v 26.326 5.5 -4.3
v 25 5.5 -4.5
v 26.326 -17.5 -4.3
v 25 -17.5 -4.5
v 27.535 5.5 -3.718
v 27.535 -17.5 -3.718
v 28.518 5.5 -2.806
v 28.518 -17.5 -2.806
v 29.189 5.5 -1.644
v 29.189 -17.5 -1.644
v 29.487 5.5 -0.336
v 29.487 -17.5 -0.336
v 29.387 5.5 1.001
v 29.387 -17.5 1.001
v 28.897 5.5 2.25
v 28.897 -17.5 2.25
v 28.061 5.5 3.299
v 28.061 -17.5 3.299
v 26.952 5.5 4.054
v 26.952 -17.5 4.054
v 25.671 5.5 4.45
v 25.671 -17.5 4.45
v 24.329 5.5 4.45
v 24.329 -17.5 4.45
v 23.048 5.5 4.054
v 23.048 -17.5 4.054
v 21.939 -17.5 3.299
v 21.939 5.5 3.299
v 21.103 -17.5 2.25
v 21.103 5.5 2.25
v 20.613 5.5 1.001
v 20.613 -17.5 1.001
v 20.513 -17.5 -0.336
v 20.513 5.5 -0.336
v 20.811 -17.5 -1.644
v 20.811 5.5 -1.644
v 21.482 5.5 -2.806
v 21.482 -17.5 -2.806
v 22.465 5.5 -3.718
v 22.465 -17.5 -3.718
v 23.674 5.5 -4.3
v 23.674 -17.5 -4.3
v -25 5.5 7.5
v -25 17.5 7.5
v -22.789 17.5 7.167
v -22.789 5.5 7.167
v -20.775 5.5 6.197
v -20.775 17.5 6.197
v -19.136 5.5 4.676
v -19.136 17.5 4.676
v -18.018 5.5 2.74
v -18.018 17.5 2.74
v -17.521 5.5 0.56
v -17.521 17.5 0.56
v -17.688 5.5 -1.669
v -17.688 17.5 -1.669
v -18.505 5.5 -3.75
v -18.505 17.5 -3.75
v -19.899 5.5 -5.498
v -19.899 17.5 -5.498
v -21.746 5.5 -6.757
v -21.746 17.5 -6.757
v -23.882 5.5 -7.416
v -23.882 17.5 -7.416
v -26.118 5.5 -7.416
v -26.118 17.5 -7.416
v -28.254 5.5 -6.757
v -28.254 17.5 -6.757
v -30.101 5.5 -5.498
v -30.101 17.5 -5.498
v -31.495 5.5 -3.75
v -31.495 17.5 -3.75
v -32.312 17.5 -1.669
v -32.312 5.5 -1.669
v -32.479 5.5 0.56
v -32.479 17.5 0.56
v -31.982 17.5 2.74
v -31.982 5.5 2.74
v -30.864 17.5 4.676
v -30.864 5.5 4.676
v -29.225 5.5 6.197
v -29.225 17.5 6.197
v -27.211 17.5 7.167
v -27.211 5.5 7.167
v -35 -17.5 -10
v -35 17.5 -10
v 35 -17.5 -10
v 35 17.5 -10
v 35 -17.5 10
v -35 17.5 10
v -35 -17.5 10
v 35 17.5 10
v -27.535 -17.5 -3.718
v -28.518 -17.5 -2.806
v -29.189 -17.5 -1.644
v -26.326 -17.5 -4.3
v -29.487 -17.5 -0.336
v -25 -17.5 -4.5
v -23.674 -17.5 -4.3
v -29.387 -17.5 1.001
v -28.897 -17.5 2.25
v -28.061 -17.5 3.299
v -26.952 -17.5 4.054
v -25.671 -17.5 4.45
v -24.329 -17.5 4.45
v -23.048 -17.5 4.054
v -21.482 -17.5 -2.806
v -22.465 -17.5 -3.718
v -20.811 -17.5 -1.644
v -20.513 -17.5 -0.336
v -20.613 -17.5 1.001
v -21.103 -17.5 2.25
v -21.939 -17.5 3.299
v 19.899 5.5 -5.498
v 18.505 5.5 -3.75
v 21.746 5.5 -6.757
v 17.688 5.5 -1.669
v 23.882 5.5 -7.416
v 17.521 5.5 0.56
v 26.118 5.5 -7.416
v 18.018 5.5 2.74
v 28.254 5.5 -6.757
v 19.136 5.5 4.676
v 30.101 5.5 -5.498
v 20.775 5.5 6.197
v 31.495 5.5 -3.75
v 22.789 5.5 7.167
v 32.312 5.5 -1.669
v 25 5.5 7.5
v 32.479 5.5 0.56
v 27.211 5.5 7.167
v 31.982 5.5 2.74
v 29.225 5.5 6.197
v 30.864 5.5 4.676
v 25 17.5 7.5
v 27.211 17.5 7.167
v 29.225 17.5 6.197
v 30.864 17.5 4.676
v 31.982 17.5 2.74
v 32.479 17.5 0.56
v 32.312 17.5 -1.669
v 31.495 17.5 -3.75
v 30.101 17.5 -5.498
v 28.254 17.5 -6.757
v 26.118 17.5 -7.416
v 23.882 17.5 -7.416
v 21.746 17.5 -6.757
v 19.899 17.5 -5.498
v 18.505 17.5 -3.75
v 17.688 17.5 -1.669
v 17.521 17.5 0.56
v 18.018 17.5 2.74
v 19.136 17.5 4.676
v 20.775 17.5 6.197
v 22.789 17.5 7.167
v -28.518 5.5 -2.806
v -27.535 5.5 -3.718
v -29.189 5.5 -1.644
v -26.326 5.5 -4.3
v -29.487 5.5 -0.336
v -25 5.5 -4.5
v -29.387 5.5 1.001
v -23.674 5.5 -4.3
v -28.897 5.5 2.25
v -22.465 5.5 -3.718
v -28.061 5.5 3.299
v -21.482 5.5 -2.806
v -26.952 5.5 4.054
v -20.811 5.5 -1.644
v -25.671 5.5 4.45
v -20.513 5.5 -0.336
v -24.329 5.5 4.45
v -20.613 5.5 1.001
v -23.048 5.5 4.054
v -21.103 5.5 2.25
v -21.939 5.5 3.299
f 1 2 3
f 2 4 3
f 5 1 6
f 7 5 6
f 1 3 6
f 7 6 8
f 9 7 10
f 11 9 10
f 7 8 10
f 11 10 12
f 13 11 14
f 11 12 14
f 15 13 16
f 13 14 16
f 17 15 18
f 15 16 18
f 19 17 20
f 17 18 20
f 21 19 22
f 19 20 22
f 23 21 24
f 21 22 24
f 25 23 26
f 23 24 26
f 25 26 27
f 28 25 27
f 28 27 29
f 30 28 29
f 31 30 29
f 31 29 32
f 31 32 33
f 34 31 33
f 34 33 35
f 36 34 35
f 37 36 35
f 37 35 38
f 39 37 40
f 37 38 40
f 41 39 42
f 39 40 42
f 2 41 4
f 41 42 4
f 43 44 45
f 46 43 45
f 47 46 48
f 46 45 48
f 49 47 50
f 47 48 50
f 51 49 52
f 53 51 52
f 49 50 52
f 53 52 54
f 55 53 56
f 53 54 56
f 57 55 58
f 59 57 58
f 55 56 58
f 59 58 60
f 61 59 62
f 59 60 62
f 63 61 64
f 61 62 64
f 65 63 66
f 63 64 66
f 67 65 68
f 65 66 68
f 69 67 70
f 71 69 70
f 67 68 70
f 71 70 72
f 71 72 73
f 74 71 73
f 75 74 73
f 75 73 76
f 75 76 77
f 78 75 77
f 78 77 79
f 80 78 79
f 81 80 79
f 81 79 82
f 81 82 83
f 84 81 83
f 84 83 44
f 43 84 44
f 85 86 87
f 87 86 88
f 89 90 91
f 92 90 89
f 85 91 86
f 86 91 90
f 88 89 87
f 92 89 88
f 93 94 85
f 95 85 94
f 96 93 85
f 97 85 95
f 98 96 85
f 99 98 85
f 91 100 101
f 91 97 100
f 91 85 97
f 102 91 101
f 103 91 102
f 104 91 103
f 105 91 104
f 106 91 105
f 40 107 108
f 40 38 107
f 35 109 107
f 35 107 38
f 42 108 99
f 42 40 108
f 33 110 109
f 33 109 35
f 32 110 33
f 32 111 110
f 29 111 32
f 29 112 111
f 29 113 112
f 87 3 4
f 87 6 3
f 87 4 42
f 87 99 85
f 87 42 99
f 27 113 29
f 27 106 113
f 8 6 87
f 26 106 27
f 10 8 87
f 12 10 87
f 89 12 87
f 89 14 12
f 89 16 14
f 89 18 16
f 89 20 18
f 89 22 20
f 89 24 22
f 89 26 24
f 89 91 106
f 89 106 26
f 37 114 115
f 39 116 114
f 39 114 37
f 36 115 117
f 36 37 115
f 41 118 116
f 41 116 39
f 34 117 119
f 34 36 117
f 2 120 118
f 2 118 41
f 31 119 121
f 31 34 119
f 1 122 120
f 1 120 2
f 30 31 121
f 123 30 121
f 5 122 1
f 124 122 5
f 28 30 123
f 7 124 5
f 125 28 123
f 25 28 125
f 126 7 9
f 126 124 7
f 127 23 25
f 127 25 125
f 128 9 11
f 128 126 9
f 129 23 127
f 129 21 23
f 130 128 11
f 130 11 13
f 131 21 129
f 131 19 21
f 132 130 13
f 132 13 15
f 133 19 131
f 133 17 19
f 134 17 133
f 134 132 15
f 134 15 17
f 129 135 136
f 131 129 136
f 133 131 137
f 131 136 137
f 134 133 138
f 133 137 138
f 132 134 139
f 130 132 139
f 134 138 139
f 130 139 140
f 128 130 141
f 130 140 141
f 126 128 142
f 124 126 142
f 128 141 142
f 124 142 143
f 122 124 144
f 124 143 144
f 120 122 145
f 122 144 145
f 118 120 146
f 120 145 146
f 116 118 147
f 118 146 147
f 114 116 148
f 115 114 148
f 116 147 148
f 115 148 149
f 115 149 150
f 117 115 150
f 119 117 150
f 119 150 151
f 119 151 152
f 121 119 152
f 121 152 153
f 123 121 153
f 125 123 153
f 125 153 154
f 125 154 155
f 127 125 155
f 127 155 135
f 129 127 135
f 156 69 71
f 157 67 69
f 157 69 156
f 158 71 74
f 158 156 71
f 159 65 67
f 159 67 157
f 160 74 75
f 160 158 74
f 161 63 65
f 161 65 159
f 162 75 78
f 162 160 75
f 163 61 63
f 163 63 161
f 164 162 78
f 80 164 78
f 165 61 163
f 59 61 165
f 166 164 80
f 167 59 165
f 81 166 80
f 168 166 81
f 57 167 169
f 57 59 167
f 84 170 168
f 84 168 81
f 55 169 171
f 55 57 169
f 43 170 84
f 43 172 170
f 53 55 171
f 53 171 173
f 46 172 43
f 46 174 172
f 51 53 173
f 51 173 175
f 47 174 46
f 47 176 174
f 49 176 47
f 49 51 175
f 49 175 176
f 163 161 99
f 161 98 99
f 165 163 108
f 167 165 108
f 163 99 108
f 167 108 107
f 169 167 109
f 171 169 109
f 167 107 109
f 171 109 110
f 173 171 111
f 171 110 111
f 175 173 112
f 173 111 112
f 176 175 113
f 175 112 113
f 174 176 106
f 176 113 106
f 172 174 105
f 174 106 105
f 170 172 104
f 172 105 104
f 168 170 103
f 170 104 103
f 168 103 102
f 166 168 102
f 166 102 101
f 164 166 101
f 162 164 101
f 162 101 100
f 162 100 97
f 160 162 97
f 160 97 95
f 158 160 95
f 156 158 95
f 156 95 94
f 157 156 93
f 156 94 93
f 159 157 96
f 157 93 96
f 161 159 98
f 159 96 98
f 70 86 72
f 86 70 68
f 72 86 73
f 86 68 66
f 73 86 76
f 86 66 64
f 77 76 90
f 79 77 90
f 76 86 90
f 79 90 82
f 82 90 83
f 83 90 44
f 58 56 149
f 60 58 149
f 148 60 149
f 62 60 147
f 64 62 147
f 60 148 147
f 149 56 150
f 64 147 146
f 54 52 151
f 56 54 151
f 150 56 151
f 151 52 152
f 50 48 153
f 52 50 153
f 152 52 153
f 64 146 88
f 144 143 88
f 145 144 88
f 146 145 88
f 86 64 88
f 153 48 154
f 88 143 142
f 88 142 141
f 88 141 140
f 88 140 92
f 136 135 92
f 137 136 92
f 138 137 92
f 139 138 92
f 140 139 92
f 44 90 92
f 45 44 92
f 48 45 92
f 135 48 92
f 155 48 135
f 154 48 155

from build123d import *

# Parameters (mm, degrees)
SKETCH_1_W                = 70
SKETCH_1_H                = 35
EXTRUDE_1_DEPTH           = 10
HOLE_WIZARD_1_D           = 9
HOLE_WIZARD_1_CBORE_D     = 15
HOLE_WIZARD_1_CBORE_DEPTH = 12


with BuildPart() as part:
    # 草图1 → 凸台-拉伸1 (new body, symmetric)
    with BuildSketch(Plane.XY):
        Rectangle(SKETCH_1_W, SKETCH_1_H)
    extrude(amount=EXTRUDE_1_DEPTH, both=True)

    # 打孔尺寸(%根据)内六角圆柱头螺钉的类型1 (through all)
    with Locations(Plane(origin=(-25, 17.5, 0), x_dir=(0, 0, 1), z_dir=(0, 1, 0))):
        with Locations((0, 0), (0, 50)):
            CounterBoreHole(HOLE_WIZARD_1_D / 2, HOLE_WIZARD_1_CBORE_D / 2, HOLE_WIZARD_1_CBORE_DEPTH)


solid = part.part
